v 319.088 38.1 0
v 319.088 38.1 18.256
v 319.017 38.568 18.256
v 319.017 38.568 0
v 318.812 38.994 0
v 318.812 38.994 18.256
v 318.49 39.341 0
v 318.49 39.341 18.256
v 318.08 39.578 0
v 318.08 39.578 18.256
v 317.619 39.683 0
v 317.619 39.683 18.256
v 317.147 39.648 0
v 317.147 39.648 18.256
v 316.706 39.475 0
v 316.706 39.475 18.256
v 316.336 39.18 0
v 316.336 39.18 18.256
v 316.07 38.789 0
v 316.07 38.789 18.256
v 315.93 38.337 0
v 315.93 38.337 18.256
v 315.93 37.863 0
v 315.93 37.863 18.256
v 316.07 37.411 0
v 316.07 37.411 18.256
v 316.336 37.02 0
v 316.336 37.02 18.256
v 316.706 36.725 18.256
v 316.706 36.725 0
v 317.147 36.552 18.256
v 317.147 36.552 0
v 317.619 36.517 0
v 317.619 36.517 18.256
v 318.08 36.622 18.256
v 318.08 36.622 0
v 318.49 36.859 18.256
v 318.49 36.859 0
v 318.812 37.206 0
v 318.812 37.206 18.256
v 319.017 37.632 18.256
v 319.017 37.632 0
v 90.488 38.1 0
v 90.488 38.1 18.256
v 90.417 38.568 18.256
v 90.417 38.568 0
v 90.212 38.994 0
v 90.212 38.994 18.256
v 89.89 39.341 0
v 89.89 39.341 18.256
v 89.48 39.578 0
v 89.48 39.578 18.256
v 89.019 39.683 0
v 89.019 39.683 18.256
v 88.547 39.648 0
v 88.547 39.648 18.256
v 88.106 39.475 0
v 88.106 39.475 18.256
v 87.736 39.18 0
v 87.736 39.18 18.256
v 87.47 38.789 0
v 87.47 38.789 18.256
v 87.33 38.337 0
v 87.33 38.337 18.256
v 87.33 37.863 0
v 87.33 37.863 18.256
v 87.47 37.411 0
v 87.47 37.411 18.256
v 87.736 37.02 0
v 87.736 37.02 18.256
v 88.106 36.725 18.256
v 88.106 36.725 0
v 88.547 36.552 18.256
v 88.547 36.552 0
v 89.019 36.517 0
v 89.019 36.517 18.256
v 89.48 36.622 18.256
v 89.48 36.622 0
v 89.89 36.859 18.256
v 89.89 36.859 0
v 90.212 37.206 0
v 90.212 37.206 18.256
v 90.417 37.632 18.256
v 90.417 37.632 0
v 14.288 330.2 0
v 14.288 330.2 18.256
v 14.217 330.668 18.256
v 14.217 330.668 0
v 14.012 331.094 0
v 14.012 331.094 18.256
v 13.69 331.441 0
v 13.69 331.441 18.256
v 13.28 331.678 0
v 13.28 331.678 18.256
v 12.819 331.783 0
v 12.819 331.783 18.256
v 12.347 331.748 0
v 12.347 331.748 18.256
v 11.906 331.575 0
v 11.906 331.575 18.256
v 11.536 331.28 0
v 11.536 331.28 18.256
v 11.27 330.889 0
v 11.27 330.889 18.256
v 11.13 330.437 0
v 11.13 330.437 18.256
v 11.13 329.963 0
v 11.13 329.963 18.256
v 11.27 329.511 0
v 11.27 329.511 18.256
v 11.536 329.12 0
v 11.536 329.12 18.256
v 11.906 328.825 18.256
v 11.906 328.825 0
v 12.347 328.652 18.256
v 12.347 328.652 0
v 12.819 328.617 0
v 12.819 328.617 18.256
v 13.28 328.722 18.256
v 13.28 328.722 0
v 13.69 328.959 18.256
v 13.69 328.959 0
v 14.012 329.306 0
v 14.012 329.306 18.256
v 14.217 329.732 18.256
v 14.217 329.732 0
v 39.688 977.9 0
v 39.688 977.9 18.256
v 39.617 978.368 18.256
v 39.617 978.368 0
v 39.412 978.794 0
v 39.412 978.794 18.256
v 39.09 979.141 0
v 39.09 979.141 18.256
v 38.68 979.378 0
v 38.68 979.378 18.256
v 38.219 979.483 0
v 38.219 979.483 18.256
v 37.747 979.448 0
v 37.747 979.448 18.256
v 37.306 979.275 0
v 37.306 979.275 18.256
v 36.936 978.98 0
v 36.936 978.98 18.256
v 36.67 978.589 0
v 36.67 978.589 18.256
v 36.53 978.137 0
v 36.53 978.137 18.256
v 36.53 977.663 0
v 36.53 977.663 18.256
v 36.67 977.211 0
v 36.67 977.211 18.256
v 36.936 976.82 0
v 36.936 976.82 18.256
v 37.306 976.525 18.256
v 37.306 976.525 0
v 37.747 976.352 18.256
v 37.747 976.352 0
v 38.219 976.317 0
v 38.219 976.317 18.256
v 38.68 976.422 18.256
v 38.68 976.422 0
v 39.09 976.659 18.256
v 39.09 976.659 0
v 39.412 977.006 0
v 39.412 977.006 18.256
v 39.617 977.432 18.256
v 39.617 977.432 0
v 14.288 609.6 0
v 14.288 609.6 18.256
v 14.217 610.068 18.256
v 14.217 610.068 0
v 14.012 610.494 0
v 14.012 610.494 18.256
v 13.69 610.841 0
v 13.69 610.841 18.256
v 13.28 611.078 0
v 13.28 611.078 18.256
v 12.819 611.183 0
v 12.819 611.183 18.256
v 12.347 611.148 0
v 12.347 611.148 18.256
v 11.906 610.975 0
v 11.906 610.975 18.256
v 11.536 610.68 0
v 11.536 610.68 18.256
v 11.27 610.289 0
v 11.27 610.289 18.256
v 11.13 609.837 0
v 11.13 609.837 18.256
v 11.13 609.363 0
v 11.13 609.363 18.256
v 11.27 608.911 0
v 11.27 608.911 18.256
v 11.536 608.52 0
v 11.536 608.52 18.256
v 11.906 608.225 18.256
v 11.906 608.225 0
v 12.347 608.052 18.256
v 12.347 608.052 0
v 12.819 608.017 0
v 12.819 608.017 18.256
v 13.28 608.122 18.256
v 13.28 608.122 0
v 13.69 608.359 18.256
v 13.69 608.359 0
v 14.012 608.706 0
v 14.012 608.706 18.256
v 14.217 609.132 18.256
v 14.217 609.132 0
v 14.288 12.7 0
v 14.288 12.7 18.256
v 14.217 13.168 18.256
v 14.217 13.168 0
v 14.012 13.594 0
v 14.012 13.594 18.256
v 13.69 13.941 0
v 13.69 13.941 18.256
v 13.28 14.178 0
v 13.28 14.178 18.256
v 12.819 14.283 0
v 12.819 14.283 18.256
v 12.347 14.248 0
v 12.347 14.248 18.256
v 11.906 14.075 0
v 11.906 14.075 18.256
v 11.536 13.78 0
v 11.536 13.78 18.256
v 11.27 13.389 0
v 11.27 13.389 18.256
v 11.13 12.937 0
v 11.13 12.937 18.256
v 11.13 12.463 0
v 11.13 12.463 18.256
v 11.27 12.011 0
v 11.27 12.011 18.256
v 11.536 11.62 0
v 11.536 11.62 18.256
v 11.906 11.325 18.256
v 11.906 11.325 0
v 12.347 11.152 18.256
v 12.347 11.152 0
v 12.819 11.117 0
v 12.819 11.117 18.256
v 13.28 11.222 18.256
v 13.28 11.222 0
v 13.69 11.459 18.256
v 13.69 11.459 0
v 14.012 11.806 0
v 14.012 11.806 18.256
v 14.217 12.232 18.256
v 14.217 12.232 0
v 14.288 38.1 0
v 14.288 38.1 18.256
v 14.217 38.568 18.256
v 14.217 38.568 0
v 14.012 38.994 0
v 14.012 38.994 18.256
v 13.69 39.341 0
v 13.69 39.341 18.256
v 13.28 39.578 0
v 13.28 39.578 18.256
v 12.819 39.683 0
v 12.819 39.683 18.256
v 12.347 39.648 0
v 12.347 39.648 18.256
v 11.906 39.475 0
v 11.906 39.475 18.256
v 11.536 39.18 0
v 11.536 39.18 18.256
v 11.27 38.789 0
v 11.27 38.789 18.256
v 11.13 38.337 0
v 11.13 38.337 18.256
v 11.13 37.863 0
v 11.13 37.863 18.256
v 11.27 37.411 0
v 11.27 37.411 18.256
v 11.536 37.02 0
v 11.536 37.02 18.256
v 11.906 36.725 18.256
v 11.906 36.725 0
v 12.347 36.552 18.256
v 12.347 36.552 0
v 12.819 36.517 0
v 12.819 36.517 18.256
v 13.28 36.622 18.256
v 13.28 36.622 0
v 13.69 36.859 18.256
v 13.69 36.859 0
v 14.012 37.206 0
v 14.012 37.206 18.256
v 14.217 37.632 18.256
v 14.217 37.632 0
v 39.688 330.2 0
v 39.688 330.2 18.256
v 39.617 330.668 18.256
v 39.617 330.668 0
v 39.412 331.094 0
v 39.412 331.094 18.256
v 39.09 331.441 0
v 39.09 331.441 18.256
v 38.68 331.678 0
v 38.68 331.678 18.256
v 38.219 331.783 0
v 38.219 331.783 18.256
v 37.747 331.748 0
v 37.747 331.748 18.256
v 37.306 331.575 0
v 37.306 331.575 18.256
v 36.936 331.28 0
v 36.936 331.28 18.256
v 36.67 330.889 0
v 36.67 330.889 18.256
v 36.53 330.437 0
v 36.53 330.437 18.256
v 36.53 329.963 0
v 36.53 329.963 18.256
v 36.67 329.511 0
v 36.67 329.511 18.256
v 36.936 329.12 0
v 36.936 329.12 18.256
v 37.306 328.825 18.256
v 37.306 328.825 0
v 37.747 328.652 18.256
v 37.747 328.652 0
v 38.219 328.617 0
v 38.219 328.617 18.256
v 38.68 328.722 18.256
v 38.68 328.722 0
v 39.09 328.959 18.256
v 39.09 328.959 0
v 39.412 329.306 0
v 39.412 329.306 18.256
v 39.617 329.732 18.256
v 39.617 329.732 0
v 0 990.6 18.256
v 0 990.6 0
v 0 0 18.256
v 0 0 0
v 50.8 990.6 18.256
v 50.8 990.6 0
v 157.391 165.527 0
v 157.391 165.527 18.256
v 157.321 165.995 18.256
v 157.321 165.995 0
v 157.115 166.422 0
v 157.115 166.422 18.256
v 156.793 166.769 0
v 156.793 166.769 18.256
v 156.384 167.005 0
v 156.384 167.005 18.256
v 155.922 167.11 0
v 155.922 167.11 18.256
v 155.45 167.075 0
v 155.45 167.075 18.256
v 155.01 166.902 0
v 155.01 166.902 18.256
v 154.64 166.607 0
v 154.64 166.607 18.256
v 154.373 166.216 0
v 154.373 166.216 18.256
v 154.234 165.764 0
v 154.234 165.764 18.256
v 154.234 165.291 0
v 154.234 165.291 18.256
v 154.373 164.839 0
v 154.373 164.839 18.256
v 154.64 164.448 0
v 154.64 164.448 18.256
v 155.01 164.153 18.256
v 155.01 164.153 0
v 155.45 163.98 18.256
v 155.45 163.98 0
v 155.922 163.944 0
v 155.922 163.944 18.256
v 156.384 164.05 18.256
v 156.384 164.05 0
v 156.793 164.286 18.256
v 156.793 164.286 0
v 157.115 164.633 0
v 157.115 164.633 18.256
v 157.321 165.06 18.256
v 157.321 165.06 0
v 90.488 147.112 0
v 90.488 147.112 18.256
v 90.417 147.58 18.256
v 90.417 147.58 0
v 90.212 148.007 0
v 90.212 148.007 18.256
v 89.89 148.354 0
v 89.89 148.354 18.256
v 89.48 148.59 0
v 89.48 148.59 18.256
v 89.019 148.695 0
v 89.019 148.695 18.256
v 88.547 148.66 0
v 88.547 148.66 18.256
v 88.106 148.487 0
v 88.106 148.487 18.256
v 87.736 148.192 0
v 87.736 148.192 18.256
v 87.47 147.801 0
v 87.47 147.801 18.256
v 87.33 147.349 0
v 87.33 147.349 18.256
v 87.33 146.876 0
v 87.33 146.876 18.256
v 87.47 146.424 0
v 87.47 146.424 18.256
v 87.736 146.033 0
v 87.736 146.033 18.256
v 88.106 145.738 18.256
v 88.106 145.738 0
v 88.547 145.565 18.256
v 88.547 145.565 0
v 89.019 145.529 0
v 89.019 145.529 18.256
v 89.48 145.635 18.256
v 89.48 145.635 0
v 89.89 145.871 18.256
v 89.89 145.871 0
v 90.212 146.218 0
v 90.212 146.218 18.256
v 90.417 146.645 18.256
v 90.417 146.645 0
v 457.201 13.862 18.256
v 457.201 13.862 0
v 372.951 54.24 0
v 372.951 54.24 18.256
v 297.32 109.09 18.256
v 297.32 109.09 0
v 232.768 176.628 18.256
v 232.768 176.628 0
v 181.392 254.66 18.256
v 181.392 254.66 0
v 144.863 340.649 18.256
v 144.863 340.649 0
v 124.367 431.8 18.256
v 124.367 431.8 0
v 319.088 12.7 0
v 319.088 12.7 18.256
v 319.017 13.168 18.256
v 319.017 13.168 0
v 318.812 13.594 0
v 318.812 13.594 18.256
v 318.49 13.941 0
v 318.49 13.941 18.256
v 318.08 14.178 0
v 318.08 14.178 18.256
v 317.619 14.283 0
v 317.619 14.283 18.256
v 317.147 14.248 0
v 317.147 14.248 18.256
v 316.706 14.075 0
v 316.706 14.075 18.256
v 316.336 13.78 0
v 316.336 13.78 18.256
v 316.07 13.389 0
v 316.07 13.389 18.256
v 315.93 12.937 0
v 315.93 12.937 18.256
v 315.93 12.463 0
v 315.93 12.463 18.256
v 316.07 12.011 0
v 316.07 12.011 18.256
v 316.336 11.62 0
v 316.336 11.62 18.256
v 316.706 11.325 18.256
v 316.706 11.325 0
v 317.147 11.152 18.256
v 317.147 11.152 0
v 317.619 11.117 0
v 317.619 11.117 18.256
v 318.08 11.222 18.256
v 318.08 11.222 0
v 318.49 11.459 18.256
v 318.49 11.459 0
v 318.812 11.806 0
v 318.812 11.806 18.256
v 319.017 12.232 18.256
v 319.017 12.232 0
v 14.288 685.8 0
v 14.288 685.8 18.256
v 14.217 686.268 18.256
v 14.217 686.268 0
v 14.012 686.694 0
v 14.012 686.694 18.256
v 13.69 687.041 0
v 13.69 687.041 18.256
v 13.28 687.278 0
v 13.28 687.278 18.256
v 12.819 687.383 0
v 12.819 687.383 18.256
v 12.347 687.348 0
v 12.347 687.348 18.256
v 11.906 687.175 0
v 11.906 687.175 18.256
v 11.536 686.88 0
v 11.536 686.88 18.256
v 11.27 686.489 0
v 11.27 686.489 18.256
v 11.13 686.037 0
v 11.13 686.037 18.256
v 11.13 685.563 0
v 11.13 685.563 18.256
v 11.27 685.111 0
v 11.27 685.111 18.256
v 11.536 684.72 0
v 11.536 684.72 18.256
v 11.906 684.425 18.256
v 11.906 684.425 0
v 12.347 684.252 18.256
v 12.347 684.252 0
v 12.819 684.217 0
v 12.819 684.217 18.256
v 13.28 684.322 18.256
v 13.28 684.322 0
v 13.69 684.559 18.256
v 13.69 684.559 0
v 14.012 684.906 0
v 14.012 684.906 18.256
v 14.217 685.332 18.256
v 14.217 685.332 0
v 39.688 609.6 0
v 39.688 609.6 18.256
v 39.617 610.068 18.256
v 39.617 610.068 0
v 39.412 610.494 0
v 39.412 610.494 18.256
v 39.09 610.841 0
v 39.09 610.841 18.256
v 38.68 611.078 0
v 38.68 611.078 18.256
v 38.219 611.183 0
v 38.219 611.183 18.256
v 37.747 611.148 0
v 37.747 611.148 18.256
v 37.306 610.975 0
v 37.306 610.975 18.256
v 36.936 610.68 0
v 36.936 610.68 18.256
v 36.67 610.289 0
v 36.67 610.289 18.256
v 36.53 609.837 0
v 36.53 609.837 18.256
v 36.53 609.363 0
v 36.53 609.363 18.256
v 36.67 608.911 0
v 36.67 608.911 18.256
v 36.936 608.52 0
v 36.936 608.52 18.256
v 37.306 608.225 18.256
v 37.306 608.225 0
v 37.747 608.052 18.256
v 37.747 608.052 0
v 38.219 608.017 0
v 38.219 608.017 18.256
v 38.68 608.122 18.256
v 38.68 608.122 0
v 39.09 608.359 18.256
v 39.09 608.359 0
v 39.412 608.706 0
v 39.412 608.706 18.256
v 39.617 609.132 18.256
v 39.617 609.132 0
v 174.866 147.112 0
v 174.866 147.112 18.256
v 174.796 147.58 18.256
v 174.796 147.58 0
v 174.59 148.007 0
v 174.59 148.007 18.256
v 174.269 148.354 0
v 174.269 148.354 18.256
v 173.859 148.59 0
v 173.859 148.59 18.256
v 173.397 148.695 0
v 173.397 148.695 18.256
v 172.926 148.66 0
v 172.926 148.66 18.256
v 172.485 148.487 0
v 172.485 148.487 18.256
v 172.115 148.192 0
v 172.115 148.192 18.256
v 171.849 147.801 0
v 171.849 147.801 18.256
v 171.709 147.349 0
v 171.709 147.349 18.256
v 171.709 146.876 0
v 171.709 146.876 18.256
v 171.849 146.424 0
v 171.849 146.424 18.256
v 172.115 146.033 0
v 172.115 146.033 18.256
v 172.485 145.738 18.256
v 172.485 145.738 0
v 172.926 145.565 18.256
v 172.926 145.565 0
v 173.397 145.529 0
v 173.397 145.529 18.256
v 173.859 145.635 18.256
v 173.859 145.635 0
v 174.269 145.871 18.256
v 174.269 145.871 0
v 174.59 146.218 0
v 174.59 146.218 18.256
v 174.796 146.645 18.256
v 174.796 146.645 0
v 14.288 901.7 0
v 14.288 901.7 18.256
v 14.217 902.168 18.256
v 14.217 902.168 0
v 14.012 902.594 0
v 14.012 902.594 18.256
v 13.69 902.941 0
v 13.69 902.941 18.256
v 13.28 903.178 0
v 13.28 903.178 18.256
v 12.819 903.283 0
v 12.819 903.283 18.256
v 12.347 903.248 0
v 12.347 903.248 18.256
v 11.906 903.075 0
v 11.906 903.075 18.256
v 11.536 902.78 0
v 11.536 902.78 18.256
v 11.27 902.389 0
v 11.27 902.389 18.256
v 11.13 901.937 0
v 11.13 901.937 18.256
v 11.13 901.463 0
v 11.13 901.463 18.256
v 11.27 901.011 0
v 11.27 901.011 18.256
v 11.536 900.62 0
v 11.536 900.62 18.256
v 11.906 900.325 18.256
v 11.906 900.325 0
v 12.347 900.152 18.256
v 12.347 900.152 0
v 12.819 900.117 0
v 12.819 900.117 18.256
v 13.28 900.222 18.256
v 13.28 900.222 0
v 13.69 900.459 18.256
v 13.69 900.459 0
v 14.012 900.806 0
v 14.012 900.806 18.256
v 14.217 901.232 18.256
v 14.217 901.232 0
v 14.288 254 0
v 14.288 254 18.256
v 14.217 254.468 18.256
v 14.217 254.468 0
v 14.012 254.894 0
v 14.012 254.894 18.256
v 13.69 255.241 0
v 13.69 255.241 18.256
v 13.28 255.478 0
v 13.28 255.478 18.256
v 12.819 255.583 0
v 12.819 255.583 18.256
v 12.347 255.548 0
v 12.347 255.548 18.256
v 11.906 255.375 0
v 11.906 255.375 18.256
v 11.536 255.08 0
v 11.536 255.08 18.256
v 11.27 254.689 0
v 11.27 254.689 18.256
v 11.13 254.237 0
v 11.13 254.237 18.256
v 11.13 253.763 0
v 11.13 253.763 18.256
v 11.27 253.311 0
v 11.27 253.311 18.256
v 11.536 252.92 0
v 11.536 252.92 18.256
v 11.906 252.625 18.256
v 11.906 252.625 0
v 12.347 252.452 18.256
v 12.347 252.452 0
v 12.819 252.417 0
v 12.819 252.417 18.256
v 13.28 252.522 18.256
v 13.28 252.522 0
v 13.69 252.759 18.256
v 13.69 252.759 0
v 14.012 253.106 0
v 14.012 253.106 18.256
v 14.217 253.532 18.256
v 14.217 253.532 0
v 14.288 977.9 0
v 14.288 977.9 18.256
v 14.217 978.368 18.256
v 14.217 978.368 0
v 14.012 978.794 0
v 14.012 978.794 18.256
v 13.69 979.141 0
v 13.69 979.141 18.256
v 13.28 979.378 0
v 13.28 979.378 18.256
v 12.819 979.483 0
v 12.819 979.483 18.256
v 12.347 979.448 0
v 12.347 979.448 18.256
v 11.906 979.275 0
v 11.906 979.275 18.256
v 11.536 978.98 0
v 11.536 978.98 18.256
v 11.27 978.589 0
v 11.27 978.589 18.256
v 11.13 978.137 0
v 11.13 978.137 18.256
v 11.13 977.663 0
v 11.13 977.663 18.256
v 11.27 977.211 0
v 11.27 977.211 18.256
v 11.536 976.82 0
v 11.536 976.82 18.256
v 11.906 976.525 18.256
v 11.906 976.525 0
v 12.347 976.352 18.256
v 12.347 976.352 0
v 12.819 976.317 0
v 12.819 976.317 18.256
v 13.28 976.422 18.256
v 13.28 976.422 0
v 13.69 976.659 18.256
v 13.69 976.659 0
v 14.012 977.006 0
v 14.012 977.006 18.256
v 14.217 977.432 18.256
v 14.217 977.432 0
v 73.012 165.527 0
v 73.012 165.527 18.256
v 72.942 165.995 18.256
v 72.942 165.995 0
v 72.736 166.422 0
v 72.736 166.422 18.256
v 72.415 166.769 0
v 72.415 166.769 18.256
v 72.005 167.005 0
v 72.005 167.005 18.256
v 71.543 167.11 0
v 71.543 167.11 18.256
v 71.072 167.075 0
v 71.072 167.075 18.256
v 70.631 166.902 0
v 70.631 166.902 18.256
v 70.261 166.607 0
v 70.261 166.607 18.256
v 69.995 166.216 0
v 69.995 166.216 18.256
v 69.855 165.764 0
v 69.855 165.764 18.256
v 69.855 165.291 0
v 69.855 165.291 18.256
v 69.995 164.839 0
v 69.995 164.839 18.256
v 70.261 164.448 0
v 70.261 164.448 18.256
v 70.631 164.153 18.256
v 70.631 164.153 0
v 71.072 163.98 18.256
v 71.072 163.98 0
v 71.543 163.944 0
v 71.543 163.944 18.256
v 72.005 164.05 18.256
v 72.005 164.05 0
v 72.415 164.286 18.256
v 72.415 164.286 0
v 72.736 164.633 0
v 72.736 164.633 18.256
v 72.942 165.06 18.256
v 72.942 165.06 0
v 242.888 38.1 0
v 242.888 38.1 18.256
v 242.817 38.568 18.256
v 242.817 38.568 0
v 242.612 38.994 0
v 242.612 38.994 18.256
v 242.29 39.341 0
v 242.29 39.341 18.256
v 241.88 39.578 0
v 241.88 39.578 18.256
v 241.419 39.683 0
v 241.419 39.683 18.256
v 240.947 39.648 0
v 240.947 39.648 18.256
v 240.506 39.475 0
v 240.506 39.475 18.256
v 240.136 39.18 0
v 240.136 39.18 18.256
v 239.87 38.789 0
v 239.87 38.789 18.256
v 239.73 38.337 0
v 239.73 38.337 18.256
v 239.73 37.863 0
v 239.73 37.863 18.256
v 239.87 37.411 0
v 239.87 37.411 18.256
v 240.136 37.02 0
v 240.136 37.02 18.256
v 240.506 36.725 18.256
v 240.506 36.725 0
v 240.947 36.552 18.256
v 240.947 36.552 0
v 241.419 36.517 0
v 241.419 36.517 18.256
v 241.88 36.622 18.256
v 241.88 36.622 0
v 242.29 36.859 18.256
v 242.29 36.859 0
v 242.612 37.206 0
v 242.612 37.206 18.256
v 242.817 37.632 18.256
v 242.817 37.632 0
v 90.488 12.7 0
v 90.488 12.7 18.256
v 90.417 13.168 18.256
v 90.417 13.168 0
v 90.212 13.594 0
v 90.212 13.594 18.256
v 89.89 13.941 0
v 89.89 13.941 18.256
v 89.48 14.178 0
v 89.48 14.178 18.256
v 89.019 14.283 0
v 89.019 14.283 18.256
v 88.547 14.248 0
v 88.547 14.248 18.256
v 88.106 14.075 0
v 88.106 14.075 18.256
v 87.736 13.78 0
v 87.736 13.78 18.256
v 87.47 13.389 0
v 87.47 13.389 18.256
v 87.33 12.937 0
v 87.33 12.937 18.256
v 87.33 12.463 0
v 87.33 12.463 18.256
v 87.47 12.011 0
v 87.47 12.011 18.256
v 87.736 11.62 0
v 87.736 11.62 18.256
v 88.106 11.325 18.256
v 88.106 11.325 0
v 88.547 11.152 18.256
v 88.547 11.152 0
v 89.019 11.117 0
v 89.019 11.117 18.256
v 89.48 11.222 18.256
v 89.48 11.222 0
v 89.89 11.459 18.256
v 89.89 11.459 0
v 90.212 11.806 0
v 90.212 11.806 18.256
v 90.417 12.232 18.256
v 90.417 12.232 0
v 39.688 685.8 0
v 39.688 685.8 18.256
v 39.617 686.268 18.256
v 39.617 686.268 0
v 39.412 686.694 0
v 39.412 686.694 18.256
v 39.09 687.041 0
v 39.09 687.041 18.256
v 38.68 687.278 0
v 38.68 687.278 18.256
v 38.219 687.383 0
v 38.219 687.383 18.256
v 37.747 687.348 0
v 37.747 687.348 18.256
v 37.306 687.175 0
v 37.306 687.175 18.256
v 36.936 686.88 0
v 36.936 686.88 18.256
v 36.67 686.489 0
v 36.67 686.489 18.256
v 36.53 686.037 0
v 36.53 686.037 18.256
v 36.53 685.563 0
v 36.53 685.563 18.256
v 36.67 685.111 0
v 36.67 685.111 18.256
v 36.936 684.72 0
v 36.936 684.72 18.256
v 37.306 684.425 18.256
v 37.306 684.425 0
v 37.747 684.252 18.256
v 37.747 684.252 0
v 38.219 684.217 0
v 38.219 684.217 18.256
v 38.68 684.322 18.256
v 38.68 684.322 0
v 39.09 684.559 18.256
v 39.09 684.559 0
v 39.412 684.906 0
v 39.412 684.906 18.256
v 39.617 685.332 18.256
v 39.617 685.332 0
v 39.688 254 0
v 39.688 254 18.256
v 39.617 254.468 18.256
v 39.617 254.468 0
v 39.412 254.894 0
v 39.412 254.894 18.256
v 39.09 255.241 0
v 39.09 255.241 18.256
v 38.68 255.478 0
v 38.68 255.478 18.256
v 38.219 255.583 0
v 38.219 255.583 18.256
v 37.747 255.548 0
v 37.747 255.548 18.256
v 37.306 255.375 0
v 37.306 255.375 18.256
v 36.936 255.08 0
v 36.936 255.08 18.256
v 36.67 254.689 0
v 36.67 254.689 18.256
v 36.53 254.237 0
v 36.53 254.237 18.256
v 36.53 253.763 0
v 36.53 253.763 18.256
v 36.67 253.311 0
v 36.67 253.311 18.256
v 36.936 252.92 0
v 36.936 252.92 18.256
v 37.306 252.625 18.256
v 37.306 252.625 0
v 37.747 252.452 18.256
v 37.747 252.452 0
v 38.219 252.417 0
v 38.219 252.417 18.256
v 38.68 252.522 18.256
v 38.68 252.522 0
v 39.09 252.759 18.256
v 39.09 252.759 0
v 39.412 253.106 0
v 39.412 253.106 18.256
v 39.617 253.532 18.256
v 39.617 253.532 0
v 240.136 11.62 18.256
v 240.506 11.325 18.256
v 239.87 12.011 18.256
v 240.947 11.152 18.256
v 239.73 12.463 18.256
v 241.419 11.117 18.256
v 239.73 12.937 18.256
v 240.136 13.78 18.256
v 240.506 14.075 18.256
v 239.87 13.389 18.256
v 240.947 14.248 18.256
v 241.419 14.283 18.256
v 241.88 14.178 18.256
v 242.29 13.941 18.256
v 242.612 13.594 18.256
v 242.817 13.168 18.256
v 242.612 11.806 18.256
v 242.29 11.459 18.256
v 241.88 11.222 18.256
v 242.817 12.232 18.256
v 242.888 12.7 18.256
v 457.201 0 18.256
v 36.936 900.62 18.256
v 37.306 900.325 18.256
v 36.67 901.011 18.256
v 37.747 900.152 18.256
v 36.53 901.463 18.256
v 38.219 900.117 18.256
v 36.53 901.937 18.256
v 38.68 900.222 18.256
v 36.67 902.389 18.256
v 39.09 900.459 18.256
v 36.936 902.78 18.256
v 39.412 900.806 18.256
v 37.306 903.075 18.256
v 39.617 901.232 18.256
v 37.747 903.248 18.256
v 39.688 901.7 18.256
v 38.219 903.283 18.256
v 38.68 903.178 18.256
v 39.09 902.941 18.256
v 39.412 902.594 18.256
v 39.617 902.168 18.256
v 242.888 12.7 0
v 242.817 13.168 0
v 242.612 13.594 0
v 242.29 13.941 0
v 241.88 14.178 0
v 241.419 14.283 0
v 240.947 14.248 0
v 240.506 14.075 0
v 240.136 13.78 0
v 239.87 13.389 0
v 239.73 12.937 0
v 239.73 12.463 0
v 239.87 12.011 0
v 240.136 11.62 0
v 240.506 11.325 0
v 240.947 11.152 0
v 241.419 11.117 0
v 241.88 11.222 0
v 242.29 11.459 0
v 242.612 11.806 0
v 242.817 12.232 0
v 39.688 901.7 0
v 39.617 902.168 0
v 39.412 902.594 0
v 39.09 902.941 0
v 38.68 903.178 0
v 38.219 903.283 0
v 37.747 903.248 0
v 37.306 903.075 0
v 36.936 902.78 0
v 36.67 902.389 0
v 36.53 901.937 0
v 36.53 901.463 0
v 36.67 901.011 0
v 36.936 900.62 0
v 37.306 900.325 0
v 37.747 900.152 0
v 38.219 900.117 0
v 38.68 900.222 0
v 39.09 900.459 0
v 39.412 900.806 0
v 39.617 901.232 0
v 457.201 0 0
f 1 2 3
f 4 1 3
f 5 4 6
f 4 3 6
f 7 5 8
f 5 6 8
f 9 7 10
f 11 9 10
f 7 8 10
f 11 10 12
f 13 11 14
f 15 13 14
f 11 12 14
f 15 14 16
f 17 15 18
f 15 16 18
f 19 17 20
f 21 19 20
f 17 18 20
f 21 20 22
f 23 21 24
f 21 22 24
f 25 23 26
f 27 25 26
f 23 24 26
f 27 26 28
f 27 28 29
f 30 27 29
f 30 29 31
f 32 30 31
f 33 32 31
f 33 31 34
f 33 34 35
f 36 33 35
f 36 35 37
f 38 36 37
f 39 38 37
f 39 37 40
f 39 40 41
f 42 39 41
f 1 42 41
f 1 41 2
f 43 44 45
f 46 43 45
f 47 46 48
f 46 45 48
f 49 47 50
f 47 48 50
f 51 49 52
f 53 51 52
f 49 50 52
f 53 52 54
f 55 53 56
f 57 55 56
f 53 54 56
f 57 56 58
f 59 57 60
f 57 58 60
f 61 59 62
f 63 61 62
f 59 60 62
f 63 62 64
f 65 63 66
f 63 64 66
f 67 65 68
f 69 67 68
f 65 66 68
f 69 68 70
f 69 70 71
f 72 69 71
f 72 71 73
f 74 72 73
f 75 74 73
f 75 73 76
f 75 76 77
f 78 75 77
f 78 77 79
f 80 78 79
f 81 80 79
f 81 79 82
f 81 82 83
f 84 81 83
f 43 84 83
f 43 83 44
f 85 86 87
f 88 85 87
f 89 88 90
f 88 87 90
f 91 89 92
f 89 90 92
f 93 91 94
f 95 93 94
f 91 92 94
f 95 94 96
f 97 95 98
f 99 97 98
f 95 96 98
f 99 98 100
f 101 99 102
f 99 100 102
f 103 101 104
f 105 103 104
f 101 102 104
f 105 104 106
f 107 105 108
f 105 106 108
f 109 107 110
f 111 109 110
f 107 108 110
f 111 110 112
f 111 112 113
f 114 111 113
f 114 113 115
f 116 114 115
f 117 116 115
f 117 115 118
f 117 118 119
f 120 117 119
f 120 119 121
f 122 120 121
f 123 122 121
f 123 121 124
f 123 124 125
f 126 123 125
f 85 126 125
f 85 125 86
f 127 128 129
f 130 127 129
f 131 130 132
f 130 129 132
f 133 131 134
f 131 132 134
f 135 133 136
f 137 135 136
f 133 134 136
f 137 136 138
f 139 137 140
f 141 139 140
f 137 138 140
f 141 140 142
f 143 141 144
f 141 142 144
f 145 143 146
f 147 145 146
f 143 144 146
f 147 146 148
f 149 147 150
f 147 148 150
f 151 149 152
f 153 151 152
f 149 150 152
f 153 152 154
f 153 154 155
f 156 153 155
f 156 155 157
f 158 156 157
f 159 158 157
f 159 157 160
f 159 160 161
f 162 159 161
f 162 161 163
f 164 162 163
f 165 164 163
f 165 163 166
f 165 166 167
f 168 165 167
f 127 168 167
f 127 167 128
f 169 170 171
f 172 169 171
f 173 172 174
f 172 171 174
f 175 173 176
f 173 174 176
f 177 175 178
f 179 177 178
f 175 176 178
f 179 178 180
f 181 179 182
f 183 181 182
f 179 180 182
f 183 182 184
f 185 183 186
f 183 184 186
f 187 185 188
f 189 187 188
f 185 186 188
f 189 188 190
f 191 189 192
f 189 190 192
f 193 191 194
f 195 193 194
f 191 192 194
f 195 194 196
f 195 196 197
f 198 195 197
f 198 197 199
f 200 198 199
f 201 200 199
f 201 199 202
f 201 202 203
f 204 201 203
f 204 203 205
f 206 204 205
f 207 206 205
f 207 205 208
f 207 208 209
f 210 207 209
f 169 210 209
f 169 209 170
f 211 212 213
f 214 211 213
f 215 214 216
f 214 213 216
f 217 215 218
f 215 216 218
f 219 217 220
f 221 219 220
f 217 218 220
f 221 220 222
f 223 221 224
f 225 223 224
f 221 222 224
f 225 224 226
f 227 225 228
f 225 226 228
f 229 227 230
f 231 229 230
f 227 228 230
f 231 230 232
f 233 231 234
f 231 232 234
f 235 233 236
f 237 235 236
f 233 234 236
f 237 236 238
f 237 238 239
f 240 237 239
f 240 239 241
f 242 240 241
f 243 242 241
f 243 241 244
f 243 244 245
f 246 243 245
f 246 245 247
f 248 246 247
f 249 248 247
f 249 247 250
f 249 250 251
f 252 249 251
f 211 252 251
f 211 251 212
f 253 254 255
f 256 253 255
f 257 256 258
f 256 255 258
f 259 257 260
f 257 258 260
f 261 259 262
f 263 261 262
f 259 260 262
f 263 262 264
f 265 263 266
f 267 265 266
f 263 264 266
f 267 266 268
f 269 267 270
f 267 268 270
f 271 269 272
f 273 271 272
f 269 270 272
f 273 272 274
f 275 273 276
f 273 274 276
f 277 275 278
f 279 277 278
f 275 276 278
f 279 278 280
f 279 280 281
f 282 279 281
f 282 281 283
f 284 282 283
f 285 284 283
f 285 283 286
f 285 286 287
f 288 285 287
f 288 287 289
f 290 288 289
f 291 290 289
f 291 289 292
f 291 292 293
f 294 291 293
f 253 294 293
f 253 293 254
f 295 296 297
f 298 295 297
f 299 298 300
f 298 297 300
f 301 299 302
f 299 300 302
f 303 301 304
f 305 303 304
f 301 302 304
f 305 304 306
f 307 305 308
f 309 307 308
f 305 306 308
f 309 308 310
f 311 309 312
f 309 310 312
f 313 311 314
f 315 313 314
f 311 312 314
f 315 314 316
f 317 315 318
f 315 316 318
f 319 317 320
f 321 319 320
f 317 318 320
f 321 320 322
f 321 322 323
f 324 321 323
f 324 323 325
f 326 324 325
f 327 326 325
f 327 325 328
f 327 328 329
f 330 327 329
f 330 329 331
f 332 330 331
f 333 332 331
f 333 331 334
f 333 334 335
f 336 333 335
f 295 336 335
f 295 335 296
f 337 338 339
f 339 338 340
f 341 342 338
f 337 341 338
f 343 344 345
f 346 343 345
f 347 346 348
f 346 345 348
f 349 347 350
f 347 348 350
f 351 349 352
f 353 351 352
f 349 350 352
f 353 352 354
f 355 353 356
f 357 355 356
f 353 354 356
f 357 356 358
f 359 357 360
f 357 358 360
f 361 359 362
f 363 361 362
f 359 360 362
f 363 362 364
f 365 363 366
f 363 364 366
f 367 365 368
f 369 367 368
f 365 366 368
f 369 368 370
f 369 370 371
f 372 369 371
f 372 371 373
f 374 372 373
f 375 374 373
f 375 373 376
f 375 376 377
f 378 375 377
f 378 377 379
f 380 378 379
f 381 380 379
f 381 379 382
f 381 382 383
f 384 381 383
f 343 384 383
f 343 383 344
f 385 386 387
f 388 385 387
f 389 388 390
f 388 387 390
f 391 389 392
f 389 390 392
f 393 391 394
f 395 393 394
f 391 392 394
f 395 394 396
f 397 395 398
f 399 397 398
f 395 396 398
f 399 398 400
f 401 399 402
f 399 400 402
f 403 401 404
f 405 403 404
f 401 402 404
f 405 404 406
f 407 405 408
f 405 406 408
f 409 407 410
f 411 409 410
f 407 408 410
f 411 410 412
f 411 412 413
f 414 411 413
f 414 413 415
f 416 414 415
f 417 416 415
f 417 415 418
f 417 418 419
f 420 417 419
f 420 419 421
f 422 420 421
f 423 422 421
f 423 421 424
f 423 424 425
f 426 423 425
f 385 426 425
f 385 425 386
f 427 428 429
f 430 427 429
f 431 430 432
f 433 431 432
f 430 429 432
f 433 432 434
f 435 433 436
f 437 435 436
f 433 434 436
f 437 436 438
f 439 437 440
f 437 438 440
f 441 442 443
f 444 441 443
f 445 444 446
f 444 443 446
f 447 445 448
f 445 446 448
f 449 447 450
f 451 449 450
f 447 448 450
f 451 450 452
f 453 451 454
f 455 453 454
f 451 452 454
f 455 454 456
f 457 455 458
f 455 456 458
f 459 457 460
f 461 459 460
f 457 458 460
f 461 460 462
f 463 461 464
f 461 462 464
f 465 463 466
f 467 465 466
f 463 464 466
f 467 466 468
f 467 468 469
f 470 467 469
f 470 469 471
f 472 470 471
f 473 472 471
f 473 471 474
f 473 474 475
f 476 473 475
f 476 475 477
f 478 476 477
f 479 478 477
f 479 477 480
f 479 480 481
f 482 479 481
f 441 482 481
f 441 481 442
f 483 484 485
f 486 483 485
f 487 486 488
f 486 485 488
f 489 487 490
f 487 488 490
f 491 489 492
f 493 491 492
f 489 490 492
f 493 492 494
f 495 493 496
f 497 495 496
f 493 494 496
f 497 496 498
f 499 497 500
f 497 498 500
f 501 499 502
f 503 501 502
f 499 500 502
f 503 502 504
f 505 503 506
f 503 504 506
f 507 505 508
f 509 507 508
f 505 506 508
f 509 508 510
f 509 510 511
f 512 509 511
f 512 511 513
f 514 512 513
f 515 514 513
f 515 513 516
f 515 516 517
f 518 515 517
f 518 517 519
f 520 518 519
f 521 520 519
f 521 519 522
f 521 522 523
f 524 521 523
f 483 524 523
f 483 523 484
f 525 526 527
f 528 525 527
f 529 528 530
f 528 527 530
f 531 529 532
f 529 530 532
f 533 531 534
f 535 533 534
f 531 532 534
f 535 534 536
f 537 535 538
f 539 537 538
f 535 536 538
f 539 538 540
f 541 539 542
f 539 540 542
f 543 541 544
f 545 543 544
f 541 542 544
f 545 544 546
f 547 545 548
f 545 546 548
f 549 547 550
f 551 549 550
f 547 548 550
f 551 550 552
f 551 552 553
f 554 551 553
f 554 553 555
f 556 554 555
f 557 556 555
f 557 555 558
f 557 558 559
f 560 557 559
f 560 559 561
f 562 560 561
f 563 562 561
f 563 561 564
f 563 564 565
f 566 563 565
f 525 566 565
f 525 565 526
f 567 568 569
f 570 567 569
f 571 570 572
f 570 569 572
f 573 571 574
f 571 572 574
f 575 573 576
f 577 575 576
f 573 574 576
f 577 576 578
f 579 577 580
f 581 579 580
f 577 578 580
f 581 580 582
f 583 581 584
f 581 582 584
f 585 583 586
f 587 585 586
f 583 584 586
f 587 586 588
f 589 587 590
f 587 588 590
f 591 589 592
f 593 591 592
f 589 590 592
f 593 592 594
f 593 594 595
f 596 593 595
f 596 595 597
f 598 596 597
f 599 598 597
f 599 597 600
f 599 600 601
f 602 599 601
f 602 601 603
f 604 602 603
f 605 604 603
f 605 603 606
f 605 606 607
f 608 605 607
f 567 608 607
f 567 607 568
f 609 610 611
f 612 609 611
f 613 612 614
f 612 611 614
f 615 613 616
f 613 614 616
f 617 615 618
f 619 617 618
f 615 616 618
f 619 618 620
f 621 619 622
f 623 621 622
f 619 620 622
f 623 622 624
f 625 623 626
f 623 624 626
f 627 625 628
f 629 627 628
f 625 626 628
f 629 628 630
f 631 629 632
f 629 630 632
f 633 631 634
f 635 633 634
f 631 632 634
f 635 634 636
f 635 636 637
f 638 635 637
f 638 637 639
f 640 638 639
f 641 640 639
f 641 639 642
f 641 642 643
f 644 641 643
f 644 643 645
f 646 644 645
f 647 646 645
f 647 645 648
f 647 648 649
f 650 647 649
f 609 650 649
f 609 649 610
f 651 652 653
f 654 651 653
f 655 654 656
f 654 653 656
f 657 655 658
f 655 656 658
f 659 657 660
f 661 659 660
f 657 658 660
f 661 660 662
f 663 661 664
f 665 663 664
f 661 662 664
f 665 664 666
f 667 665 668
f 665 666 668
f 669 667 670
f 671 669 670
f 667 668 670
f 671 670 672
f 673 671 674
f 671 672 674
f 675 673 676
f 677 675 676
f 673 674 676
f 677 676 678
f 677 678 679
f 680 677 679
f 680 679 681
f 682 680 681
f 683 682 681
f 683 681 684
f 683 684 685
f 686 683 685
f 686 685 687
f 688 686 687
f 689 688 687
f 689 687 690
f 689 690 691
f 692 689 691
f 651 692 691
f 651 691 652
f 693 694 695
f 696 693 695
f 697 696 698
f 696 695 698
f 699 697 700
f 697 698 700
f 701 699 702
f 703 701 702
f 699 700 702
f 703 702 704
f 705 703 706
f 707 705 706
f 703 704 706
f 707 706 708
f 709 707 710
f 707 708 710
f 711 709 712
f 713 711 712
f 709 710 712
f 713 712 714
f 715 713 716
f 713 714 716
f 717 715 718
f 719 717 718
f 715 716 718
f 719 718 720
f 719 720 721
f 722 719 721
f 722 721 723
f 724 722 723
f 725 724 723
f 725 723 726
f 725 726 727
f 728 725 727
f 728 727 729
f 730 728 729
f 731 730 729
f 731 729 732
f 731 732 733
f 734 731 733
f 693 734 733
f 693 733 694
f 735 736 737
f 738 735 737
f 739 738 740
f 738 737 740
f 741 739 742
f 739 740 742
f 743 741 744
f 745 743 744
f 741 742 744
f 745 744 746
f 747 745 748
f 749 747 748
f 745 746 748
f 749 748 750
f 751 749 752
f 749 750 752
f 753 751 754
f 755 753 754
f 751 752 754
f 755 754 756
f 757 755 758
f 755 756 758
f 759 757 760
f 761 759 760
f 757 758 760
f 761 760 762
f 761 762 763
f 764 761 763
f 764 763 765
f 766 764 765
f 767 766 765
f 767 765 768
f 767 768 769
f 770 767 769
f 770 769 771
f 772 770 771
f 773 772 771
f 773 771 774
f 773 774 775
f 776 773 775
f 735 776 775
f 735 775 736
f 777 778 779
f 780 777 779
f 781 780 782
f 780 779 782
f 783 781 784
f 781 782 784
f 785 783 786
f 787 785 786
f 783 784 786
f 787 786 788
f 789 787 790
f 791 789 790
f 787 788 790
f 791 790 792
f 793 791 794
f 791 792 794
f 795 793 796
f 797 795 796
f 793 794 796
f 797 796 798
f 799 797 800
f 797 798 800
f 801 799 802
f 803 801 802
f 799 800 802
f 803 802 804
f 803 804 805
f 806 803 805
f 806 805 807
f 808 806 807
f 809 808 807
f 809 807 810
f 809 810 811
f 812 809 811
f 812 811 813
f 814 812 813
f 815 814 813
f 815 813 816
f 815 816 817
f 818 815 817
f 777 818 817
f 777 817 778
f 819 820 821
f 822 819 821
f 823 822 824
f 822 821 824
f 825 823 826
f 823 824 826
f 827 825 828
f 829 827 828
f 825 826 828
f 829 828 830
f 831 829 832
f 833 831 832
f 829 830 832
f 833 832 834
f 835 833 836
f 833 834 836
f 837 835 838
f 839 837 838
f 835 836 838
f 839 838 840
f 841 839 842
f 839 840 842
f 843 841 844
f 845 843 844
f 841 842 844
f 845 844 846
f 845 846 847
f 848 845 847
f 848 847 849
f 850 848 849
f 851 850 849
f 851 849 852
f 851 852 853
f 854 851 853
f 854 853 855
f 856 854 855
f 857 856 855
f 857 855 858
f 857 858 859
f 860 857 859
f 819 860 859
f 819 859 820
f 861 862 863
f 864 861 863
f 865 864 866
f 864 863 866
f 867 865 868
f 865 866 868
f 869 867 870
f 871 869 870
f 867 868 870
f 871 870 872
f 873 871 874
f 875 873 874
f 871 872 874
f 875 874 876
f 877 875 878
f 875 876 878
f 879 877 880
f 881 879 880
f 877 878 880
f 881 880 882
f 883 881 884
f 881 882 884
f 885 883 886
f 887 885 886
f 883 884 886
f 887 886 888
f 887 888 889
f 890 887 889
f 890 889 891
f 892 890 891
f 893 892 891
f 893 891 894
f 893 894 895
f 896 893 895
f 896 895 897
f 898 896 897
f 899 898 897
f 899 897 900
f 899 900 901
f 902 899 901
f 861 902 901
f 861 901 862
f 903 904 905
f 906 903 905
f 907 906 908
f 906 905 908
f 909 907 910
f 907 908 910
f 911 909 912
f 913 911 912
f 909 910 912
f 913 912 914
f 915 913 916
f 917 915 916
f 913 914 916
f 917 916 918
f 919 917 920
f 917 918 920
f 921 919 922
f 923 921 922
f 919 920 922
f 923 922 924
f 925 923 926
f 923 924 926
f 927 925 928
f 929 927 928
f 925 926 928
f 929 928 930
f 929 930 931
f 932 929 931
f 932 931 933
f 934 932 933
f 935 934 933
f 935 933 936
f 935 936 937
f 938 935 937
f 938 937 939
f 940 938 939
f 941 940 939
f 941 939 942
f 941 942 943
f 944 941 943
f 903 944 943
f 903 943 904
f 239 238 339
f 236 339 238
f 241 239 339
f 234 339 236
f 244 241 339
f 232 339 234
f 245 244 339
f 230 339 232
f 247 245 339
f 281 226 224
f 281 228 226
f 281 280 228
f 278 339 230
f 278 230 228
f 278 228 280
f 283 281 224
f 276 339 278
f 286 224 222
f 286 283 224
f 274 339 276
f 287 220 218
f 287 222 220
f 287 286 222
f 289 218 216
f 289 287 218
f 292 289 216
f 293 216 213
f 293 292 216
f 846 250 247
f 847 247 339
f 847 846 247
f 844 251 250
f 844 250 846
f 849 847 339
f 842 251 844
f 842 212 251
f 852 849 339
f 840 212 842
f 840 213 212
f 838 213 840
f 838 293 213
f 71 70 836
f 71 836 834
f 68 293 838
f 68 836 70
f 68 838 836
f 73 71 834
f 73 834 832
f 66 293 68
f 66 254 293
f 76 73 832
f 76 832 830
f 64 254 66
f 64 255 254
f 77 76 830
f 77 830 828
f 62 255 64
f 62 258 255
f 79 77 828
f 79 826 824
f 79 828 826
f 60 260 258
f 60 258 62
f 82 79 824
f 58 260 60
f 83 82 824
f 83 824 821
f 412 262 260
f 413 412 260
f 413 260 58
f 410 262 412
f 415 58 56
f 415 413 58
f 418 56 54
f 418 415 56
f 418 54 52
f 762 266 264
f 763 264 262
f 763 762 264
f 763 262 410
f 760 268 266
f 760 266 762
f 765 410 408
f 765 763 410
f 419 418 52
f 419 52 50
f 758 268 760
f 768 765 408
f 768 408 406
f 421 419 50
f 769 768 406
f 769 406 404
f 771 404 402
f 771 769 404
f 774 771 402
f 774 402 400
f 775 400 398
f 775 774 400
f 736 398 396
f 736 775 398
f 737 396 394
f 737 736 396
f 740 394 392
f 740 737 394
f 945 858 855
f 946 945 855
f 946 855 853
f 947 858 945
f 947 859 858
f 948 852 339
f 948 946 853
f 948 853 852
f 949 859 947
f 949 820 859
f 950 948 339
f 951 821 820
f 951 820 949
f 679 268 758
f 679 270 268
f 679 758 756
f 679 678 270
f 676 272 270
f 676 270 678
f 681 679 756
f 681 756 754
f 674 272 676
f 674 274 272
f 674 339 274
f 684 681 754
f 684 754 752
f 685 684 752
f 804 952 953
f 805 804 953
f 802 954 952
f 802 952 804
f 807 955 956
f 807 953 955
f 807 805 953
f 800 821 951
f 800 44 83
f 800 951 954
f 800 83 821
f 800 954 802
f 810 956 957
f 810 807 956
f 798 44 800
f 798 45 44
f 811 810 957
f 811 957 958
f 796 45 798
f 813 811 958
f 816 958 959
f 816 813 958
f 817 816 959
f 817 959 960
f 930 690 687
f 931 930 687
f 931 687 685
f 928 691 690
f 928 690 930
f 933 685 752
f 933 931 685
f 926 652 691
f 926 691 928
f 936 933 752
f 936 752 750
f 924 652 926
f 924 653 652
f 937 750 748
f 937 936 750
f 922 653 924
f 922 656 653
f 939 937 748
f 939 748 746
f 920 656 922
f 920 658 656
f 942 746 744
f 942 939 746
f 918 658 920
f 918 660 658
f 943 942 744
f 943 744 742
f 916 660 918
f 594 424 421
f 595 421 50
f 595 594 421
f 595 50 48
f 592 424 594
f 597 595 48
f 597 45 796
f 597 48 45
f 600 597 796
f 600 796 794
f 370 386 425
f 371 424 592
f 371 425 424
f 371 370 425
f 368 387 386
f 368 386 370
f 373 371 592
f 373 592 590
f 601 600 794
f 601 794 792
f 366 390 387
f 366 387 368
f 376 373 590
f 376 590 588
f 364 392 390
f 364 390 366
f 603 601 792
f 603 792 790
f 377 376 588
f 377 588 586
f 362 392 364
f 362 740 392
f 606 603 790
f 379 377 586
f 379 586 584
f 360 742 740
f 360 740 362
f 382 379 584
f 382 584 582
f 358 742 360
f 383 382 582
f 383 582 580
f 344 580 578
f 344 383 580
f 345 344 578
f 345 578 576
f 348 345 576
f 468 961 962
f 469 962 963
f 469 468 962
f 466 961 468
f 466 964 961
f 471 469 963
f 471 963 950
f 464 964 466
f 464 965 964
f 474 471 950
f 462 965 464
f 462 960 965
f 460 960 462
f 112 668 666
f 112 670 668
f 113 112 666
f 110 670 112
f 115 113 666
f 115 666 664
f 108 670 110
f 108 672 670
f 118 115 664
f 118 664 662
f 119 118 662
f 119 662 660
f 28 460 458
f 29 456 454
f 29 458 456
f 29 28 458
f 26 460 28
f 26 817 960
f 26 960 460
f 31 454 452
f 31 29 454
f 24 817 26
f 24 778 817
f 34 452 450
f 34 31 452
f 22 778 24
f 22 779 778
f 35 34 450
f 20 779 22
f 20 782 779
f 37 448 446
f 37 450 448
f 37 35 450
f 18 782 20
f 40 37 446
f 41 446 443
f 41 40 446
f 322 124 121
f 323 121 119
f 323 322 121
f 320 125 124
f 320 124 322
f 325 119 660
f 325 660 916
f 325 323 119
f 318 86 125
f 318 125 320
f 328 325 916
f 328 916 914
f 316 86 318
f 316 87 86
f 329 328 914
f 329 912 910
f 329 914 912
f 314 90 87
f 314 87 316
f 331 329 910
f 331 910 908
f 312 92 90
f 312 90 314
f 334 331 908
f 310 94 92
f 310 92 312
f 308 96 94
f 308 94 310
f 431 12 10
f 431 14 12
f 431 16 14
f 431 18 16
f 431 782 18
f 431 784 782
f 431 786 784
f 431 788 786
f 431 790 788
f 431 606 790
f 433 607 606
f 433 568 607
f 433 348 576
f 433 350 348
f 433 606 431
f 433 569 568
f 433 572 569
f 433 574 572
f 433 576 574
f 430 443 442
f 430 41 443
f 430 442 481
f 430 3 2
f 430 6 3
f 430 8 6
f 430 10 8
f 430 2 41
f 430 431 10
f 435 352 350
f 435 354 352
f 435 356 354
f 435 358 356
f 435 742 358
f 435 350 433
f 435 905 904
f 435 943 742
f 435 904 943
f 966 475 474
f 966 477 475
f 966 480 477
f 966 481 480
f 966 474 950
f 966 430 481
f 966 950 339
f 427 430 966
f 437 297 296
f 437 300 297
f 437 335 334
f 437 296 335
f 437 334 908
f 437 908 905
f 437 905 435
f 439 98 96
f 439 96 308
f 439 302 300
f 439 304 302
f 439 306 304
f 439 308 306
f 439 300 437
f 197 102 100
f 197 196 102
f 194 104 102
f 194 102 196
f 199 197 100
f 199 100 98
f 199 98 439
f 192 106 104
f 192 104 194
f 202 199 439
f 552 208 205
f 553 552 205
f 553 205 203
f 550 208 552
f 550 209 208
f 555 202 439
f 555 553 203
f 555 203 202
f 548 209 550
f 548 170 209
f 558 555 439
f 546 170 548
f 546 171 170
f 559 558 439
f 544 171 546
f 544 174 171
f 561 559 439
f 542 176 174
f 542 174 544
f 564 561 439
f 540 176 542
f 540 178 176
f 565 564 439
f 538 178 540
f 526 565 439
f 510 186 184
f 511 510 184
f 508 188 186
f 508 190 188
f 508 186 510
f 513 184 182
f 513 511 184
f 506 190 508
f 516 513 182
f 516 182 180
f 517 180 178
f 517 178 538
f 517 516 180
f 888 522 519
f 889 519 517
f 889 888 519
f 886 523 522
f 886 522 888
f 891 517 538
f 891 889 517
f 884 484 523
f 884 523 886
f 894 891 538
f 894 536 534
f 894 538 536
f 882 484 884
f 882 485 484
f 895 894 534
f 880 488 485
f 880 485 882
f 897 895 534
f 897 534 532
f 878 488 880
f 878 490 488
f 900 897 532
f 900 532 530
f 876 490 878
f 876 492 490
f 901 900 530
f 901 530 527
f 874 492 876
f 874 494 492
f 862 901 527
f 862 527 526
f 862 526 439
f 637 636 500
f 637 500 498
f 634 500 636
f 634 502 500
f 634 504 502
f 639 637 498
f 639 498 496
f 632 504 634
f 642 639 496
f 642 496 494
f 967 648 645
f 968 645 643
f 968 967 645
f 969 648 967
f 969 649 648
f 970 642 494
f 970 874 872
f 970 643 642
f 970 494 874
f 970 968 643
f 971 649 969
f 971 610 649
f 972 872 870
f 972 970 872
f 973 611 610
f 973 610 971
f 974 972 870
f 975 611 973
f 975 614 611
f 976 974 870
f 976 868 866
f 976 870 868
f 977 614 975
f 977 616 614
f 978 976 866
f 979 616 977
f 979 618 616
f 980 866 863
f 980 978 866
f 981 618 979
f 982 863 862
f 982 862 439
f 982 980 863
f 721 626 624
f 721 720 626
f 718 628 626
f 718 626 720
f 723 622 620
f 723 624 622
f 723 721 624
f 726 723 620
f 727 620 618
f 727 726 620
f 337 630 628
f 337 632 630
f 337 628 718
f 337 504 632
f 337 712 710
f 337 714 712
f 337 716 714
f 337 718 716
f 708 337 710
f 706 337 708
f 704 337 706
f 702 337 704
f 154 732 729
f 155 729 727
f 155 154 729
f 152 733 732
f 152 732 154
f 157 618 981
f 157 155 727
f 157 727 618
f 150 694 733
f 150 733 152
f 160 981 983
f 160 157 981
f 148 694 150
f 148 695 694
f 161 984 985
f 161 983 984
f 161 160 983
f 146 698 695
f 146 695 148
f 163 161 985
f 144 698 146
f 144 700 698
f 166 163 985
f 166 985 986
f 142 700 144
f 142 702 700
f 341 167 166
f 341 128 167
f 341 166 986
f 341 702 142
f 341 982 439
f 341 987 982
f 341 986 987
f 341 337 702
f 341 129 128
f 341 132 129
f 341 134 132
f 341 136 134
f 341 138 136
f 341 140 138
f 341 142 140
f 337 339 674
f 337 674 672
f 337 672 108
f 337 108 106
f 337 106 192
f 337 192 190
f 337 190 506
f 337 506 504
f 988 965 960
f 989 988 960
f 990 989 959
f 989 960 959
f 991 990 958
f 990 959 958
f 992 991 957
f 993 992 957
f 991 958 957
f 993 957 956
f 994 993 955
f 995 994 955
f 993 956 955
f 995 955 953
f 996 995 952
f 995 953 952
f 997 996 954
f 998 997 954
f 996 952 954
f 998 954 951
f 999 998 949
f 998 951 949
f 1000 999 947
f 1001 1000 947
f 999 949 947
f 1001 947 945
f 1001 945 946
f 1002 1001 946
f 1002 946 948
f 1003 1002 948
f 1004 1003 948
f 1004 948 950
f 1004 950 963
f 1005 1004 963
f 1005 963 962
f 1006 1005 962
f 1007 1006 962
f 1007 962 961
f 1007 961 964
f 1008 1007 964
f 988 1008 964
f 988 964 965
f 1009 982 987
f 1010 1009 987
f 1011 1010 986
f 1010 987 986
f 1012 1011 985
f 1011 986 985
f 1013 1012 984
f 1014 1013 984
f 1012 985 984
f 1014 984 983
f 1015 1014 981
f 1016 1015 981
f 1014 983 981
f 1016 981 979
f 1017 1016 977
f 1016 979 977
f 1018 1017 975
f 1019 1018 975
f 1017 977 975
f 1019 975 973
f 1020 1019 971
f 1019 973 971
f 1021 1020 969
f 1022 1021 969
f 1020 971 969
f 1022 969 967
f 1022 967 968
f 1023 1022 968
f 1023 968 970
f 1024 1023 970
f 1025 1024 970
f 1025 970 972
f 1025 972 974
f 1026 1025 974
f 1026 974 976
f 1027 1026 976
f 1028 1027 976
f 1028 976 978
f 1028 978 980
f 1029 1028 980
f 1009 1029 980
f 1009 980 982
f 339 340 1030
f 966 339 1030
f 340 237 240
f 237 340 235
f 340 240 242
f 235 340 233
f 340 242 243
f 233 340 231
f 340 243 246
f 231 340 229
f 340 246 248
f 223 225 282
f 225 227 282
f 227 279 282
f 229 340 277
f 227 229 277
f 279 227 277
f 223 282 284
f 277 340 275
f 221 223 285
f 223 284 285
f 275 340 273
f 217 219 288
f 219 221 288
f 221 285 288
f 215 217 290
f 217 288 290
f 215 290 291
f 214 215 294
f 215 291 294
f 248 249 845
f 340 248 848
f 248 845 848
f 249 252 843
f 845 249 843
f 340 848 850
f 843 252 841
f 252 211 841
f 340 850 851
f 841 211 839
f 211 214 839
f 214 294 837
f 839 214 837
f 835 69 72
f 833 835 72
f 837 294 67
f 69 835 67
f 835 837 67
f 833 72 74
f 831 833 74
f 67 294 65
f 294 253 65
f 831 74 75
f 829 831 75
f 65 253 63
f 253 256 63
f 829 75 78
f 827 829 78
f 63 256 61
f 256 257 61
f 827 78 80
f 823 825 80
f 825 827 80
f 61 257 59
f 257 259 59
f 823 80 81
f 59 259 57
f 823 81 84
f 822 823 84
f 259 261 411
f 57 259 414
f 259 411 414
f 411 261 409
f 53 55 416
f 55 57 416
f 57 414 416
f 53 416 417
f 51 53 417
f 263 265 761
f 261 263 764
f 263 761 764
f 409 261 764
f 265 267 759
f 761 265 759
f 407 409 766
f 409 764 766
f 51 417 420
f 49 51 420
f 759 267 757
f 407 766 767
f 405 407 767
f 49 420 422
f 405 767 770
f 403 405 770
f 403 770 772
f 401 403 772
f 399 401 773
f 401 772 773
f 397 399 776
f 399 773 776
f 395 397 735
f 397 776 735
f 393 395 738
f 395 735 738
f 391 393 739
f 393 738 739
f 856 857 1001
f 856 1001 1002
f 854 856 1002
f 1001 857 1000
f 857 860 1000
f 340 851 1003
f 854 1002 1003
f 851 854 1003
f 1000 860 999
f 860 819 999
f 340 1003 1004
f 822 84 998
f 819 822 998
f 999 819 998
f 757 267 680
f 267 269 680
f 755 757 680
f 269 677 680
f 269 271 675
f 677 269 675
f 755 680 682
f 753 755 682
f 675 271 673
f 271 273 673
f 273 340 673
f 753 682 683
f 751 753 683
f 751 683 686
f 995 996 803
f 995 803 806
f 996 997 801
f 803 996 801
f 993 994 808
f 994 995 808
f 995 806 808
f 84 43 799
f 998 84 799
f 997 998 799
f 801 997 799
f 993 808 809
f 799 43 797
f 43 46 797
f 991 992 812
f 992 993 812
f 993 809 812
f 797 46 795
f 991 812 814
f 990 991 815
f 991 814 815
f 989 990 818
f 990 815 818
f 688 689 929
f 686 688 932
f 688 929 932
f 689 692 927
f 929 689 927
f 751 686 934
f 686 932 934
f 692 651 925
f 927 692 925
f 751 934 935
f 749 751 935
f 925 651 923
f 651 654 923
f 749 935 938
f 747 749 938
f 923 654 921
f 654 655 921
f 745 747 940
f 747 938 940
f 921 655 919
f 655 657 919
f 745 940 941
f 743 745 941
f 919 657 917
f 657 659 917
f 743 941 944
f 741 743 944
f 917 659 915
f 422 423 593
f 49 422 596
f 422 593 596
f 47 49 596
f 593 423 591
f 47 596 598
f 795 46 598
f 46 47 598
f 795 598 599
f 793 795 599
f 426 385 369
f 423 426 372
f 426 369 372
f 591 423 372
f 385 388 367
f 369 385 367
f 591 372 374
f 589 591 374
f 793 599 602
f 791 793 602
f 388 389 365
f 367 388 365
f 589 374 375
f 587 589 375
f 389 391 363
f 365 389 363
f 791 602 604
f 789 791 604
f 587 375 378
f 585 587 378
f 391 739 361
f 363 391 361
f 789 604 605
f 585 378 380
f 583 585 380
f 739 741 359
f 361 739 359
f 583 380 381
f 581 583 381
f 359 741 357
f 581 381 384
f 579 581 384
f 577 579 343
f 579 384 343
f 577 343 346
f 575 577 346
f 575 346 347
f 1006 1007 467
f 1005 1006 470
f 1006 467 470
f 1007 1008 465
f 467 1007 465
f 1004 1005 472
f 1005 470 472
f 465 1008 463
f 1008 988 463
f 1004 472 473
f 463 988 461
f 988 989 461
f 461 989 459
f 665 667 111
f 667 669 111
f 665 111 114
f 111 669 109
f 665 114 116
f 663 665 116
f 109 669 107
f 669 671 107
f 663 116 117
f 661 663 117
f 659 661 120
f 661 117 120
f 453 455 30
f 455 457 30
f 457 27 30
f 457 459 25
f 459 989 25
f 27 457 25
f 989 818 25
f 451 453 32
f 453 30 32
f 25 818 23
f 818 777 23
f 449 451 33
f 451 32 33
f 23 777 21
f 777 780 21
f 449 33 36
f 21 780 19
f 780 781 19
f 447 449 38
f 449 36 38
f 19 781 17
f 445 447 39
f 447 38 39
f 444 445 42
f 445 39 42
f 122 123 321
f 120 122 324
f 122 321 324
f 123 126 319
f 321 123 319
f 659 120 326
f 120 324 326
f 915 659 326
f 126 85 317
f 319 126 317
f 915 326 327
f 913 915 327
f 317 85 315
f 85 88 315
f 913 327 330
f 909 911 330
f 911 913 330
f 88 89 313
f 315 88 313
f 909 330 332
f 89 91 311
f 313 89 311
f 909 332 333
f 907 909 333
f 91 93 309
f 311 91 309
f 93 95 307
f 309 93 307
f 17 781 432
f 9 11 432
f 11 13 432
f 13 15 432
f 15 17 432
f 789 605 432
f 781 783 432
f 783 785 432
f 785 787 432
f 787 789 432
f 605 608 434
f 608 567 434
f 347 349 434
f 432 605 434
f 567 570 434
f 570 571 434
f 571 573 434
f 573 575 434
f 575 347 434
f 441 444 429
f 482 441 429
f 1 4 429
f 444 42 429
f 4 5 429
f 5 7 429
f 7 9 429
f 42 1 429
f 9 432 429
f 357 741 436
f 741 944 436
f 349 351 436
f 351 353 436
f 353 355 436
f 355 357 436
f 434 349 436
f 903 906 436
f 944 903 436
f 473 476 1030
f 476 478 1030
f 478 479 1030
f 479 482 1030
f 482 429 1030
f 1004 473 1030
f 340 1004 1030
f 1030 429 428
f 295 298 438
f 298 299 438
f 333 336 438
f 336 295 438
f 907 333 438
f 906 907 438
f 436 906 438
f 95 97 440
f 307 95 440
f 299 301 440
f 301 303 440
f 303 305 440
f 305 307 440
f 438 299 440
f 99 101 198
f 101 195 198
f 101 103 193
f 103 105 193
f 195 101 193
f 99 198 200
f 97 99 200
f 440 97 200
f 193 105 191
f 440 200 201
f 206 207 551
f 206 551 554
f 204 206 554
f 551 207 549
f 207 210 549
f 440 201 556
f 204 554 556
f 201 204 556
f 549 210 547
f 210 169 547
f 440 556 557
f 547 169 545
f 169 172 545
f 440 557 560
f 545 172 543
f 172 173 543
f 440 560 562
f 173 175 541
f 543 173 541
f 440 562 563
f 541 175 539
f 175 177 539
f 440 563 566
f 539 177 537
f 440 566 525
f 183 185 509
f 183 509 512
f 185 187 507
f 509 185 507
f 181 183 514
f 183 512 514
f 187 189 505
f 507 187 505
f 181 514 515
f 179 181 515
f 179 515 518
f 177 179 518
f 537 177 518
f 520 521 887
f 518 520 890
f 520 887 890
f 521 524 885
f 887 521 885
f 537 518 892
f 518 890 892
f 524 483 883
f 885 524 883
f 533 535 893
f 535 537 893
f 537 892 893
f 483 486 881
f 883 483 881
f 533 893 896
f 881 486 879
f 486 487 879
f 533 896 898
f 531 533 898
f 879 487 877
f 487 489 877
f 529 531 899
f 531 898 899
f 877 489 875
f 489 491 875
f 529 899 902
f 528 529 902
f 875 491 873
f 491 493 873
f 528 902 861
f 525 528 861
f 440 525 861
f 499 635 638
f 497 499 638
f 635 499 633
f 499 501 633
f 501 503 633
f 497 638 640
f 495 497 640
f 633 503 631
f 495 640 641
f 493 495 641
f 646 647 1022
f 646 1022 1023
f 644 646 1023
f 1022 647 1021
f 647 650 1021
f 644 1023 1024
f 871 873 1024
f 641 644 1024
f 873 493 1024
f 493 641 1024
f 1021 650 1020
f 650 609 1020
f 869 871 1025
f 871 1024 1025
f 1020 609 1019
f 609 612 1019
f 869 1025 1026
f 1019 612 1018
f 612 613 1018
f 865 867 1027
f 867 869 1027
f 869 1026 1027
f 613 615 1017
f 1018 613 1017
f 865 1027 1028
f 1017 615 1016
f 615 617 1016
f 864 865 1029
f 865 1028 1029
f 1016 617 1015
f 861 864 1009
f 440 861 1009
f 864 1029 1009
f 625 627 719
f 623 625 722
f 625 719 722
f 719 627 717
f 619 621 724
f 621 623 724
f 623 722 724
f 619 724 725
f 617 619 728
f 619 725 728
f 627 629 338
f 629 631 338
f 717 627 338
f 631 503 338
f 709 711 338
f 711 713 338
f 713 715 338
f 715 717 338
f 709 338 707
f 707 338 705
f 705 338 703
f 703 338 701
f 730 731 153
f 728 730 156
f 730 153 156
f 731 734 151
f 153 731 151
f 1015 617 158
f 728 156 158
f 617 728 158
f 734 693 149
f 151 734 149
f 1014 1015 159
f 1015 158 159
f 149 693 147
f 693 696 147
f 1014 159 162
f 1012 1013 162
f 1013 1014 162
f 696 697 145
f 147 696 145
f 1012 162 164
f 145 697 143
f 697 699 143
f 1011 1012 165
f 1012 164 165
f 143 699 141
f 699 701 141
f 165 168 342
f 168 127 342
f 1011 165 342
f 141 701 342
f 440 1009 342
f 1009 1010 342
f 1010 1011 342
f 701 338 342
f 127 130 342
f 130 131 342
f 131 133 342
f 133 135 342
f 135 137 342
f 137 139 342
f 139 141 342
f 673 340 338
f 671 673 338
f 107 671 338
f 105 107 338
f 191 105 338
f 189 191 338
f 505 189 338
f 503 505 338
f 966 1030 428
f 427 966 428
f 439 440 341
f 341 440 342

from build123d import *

# Parameters (mm, degrees)
BOSS_EXTRUDE1_DEPTH = 18.25625
SKETCH2_R           = 1.5875
CUT_EXTRUDE1_DEPTH  = 19.25625
SKETCH3_R           = 1.5875
CUT_EXTRUDE2_DEPTH  = 19.25625


with BuildPart() as part:
    # Sketch1 → Boss-Extrude1 (new body)
    with BuildSketch(Plane.XY):
        with BuildLine():
            Line((0, 990.6), (0, 0))
            Line((0, 0), (457.201, 0))
            Line((457.201, 0), (457.201, 13.862038208))
            ThreePointArc((457.201, 13.862038208), (232.767577124, 176.628269142), (124.367415652, 431.8))
            Line((124.367415652, 431.8), (50.8, 990.6))
            Line((50.8, 990.6), (0, 990.6))
        make_face()
    extrude(amount=BOSS_EXTRUDE1_DEPTH)

    # Sketch2 → Cut-Extrude1 (cut, through all)
    with BuildSketch(Plane.XY.offset(18.25625)):
        with Locations((12.7, 977.9)):
            Circle(SKETCH2_R)
        with Locations((38.1, 977.9)):
            Circle(SKETCH2_R)
        with Locations((12.7, 901.7)):
            Circle(SKETCH2_R)
        with Locations((38.1, 901.7)):
            Circle(SKETCH2_R)
        with Locations((12.7, 609.6)):
            Circle(SKETCH2_R)
        with Locations((38.1, 609.6)):
            Circle(SKETCH2_R)
        with Locations((12.7, 685.8)):
            Circle(SKETCH2_R)
        with Locations((38.1, 685.8)):
            Circle(SKETCH2_R)
        with Locations((12.7, 254)):
            Circle(SKETCH2_R)
        with Locations((38.1, 254)):
            Circle(SKETCH2_R)
        with Locations((12.7, 330.2)):
            Circle(SKETCH2_R)
        with Locations((38.1, 330.2)):
            Circle(SKETCH2_R)
        with Locations((12.7, 38.1)):
            Circle(SKETCH2_R)
        with Locations((12.7, 12.7)):
            Circle(SKETCH2_R)
        with Locations((88.9, 38.1)):
            Circle(SKETCH2_R)
        with Locations((88.9, 12.7)):
            Circle(SKETCH2_R)
        with Locations((241.3, 38.1)):
            Circle(SKETCH2_R)
        with Locations((317.5, 38.1)):
            Circle(SKETCH2_R)
        with Locations((241.3, 12.7)):
            Circle(SKETCH2_R)
        with Locations((317.5, 12.7)):
            Circle(SKETCH2_R)
    extrude(amount=-CUT_EXTRUDE1_DEPTH, mode=Mode.SUBTRACT)

    # Sketch3 → Cut-Extrude2 (cut, through all)
    with BuildSketch(Plane.XY.offset(18.25625)):
        with Locations((88.9, 147.112433493)):
            Circle(SKETCH3_R)
        with Locations((71.4248, 165.527433493)):
            Circle(SKETCH3_R)
        with Locations((155.8036, 165.527433493)):
            Circle(SKETCH3_R)
        with Locations((173.2788, 147.112433493)):
            Circle(SKETCH3_R)
    extrude(amount=-CUT_EXTRUDE2_DEPTH, mode=Mode.SUBTRACT)


solid = part.part
